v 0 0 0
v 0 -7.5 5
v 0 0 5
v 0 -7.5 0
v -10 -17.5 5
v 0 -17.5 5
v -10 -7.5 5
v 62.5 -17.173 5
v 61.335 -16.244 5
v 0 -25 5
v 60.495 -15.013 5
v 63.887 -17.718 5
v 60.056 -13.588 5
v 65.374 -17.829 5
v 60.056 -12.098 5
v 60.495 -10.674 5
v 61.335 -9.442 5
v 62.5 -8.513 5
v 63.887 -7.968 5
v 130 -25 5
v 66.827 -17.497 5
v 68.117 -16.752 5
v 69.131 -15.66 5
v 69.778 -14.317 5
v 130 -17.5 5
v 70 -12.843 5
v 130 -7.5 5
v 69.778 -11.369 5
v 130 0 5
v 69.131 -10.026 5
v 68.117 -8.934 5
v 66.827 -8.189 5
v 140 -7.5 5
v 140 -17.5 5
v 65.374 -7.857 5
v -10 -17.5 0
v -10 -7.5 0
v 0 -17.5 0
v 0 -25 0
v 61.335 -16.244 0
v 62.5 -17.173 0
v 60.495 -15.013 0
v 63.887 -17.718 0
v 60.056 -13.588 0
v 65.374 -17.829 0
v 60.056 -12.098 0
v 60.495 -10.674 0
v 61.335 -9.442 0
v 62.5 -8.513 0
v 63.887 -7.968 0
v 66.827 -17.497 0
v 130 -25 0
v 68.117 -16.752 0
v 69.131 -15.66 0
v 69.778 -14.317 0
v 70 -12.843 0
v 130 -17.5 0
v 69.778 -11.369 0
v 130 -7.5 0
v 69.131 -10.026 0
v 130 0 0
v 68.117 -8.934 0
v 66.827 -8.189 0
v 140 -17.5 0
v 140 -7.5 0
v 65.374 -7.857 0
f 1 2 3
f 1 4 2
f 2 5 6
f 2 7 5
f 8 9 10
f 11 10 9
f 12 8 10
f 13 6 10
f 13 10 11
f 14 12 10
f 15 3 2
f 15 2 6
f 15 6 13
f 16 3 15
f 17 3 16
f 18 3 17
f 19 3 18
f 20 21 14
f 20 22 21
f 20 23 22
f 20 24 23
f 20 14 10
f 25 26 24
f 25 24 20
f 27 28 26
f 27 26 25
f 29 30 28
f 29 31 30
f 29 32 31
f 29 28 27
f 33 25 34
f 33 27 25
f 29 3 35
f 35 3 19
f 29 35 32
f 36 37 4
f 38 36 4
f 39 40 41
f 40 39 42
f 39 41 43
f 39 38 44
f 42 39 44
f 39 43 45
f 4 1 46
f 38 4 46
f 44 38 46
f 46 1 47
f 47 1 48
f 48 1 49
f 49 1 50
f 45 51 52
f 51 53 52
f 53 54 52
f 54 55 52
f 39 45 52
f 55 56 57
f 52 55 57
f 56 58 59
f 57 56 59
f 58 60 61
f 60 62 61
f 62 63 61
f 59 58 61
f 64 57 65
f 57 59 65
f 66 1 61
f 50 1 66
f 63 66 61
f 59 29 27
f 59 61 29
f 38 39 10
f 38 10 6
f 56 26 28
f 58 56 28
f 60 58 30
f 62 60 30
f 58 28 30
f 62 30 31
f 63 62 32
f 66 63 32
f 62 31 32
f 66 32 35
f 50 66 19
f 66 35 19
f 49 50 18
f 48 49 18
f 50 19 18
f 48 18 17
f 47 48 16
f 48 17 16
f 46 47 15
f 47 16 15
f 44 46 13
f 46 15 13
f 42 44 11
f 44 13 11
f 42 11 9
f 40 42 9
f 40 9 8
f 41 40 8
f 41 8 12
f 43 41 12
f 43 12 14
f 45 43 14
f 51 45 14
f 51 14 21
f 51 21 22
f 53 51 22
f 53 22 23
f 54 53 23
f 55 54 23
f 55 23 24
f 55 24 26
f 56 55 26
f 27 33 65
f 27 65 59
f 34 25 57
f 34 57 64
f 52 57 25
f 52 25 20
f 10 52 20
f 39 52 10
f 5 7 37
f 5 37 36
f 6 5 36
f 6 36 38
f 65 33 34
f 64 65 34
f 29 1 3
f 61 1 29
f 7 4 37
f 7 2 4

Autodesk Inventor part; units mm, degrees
ref_plane "YZ Plane" through (0, 0, 0) normal (1, 0, 0) x (0, 1, 0)
ref_plane "XZ Plane" through (0, 0, 0) normal (0, 1, 0) x (-1, 0, 0)
ref_plane "XY Plane" through (0, 0, 0) normal (0, 0, 1) x (1, 0, 0)
sketch "Boceto1" plane through (0, 0, 0) normal (0, 0, 1) x (1, 0, 0)
  line L0 (0, 0) -> (130, 0)
  line L1 (130, 0) -> (130, -25)
  line L2 (130, -25) -> (0, -25)
  line L3 (0, -25) -> (0, 0)
  dimension "d0" = 130
  dimension "d1" = 25
extrude "Extrusión1" add sketch "Boceto1" along normal blind 5
sketch "Boceto2" plane through (0, 0, 5) normal (0, 0, 1) x (1, 0, 0)
  line L0 (130, 0) -> (130, -25) projected
  line L1 (0, -25) -> (0, 0) projected
  line L2 (-10, -7.5) -> (-10, -17.5)
  line L3 (140, -7.5) -> (140, -17.5)
  line L4 (0, -7.5) -> (0, -17.5)
  line L5 (130, -7.5) -> (130, -17.5)
  line L6 (140, -7.5) -> (130, -7.5)
  line L7 (0, -7.5) -> (-10, -7.5)
  line L8 (-10, -17.5) -> (0, -17.5)
  line L9 (130, -17.5) -> (140, -17.5)
  line L10 (0, 0) -> (130, 0) projected
  line L11 (130, -25) -> (0, -25) projected
  dimension "d5" = 10
  dimension "d6" = 10
  dimension "d12" = 7.5
  dimension "d13" = 10
  dimension "d14" = 10
  dimension "d15" = 7.5
extrude "Extrusión2" add sketch "Boceto2" against normal blind 5 contours L6 L3 L9 L0 | L1 L8 L2 L7
sketch "Boceto3" plane through (0, 0, 5) normal (0, 0, 1) x (1, 0, 0)
  circle A0 centre (65, -12.8431) radius 5
  line L0 (130, -17.5) -> (130, -25) projected
  dimension "d9" = 10
  dimension "d16" = 65
extrude "Extrusión3" cut sketch "Boceto3" against normal blind 5
properties part number "pieza lateral z refuerzo"
